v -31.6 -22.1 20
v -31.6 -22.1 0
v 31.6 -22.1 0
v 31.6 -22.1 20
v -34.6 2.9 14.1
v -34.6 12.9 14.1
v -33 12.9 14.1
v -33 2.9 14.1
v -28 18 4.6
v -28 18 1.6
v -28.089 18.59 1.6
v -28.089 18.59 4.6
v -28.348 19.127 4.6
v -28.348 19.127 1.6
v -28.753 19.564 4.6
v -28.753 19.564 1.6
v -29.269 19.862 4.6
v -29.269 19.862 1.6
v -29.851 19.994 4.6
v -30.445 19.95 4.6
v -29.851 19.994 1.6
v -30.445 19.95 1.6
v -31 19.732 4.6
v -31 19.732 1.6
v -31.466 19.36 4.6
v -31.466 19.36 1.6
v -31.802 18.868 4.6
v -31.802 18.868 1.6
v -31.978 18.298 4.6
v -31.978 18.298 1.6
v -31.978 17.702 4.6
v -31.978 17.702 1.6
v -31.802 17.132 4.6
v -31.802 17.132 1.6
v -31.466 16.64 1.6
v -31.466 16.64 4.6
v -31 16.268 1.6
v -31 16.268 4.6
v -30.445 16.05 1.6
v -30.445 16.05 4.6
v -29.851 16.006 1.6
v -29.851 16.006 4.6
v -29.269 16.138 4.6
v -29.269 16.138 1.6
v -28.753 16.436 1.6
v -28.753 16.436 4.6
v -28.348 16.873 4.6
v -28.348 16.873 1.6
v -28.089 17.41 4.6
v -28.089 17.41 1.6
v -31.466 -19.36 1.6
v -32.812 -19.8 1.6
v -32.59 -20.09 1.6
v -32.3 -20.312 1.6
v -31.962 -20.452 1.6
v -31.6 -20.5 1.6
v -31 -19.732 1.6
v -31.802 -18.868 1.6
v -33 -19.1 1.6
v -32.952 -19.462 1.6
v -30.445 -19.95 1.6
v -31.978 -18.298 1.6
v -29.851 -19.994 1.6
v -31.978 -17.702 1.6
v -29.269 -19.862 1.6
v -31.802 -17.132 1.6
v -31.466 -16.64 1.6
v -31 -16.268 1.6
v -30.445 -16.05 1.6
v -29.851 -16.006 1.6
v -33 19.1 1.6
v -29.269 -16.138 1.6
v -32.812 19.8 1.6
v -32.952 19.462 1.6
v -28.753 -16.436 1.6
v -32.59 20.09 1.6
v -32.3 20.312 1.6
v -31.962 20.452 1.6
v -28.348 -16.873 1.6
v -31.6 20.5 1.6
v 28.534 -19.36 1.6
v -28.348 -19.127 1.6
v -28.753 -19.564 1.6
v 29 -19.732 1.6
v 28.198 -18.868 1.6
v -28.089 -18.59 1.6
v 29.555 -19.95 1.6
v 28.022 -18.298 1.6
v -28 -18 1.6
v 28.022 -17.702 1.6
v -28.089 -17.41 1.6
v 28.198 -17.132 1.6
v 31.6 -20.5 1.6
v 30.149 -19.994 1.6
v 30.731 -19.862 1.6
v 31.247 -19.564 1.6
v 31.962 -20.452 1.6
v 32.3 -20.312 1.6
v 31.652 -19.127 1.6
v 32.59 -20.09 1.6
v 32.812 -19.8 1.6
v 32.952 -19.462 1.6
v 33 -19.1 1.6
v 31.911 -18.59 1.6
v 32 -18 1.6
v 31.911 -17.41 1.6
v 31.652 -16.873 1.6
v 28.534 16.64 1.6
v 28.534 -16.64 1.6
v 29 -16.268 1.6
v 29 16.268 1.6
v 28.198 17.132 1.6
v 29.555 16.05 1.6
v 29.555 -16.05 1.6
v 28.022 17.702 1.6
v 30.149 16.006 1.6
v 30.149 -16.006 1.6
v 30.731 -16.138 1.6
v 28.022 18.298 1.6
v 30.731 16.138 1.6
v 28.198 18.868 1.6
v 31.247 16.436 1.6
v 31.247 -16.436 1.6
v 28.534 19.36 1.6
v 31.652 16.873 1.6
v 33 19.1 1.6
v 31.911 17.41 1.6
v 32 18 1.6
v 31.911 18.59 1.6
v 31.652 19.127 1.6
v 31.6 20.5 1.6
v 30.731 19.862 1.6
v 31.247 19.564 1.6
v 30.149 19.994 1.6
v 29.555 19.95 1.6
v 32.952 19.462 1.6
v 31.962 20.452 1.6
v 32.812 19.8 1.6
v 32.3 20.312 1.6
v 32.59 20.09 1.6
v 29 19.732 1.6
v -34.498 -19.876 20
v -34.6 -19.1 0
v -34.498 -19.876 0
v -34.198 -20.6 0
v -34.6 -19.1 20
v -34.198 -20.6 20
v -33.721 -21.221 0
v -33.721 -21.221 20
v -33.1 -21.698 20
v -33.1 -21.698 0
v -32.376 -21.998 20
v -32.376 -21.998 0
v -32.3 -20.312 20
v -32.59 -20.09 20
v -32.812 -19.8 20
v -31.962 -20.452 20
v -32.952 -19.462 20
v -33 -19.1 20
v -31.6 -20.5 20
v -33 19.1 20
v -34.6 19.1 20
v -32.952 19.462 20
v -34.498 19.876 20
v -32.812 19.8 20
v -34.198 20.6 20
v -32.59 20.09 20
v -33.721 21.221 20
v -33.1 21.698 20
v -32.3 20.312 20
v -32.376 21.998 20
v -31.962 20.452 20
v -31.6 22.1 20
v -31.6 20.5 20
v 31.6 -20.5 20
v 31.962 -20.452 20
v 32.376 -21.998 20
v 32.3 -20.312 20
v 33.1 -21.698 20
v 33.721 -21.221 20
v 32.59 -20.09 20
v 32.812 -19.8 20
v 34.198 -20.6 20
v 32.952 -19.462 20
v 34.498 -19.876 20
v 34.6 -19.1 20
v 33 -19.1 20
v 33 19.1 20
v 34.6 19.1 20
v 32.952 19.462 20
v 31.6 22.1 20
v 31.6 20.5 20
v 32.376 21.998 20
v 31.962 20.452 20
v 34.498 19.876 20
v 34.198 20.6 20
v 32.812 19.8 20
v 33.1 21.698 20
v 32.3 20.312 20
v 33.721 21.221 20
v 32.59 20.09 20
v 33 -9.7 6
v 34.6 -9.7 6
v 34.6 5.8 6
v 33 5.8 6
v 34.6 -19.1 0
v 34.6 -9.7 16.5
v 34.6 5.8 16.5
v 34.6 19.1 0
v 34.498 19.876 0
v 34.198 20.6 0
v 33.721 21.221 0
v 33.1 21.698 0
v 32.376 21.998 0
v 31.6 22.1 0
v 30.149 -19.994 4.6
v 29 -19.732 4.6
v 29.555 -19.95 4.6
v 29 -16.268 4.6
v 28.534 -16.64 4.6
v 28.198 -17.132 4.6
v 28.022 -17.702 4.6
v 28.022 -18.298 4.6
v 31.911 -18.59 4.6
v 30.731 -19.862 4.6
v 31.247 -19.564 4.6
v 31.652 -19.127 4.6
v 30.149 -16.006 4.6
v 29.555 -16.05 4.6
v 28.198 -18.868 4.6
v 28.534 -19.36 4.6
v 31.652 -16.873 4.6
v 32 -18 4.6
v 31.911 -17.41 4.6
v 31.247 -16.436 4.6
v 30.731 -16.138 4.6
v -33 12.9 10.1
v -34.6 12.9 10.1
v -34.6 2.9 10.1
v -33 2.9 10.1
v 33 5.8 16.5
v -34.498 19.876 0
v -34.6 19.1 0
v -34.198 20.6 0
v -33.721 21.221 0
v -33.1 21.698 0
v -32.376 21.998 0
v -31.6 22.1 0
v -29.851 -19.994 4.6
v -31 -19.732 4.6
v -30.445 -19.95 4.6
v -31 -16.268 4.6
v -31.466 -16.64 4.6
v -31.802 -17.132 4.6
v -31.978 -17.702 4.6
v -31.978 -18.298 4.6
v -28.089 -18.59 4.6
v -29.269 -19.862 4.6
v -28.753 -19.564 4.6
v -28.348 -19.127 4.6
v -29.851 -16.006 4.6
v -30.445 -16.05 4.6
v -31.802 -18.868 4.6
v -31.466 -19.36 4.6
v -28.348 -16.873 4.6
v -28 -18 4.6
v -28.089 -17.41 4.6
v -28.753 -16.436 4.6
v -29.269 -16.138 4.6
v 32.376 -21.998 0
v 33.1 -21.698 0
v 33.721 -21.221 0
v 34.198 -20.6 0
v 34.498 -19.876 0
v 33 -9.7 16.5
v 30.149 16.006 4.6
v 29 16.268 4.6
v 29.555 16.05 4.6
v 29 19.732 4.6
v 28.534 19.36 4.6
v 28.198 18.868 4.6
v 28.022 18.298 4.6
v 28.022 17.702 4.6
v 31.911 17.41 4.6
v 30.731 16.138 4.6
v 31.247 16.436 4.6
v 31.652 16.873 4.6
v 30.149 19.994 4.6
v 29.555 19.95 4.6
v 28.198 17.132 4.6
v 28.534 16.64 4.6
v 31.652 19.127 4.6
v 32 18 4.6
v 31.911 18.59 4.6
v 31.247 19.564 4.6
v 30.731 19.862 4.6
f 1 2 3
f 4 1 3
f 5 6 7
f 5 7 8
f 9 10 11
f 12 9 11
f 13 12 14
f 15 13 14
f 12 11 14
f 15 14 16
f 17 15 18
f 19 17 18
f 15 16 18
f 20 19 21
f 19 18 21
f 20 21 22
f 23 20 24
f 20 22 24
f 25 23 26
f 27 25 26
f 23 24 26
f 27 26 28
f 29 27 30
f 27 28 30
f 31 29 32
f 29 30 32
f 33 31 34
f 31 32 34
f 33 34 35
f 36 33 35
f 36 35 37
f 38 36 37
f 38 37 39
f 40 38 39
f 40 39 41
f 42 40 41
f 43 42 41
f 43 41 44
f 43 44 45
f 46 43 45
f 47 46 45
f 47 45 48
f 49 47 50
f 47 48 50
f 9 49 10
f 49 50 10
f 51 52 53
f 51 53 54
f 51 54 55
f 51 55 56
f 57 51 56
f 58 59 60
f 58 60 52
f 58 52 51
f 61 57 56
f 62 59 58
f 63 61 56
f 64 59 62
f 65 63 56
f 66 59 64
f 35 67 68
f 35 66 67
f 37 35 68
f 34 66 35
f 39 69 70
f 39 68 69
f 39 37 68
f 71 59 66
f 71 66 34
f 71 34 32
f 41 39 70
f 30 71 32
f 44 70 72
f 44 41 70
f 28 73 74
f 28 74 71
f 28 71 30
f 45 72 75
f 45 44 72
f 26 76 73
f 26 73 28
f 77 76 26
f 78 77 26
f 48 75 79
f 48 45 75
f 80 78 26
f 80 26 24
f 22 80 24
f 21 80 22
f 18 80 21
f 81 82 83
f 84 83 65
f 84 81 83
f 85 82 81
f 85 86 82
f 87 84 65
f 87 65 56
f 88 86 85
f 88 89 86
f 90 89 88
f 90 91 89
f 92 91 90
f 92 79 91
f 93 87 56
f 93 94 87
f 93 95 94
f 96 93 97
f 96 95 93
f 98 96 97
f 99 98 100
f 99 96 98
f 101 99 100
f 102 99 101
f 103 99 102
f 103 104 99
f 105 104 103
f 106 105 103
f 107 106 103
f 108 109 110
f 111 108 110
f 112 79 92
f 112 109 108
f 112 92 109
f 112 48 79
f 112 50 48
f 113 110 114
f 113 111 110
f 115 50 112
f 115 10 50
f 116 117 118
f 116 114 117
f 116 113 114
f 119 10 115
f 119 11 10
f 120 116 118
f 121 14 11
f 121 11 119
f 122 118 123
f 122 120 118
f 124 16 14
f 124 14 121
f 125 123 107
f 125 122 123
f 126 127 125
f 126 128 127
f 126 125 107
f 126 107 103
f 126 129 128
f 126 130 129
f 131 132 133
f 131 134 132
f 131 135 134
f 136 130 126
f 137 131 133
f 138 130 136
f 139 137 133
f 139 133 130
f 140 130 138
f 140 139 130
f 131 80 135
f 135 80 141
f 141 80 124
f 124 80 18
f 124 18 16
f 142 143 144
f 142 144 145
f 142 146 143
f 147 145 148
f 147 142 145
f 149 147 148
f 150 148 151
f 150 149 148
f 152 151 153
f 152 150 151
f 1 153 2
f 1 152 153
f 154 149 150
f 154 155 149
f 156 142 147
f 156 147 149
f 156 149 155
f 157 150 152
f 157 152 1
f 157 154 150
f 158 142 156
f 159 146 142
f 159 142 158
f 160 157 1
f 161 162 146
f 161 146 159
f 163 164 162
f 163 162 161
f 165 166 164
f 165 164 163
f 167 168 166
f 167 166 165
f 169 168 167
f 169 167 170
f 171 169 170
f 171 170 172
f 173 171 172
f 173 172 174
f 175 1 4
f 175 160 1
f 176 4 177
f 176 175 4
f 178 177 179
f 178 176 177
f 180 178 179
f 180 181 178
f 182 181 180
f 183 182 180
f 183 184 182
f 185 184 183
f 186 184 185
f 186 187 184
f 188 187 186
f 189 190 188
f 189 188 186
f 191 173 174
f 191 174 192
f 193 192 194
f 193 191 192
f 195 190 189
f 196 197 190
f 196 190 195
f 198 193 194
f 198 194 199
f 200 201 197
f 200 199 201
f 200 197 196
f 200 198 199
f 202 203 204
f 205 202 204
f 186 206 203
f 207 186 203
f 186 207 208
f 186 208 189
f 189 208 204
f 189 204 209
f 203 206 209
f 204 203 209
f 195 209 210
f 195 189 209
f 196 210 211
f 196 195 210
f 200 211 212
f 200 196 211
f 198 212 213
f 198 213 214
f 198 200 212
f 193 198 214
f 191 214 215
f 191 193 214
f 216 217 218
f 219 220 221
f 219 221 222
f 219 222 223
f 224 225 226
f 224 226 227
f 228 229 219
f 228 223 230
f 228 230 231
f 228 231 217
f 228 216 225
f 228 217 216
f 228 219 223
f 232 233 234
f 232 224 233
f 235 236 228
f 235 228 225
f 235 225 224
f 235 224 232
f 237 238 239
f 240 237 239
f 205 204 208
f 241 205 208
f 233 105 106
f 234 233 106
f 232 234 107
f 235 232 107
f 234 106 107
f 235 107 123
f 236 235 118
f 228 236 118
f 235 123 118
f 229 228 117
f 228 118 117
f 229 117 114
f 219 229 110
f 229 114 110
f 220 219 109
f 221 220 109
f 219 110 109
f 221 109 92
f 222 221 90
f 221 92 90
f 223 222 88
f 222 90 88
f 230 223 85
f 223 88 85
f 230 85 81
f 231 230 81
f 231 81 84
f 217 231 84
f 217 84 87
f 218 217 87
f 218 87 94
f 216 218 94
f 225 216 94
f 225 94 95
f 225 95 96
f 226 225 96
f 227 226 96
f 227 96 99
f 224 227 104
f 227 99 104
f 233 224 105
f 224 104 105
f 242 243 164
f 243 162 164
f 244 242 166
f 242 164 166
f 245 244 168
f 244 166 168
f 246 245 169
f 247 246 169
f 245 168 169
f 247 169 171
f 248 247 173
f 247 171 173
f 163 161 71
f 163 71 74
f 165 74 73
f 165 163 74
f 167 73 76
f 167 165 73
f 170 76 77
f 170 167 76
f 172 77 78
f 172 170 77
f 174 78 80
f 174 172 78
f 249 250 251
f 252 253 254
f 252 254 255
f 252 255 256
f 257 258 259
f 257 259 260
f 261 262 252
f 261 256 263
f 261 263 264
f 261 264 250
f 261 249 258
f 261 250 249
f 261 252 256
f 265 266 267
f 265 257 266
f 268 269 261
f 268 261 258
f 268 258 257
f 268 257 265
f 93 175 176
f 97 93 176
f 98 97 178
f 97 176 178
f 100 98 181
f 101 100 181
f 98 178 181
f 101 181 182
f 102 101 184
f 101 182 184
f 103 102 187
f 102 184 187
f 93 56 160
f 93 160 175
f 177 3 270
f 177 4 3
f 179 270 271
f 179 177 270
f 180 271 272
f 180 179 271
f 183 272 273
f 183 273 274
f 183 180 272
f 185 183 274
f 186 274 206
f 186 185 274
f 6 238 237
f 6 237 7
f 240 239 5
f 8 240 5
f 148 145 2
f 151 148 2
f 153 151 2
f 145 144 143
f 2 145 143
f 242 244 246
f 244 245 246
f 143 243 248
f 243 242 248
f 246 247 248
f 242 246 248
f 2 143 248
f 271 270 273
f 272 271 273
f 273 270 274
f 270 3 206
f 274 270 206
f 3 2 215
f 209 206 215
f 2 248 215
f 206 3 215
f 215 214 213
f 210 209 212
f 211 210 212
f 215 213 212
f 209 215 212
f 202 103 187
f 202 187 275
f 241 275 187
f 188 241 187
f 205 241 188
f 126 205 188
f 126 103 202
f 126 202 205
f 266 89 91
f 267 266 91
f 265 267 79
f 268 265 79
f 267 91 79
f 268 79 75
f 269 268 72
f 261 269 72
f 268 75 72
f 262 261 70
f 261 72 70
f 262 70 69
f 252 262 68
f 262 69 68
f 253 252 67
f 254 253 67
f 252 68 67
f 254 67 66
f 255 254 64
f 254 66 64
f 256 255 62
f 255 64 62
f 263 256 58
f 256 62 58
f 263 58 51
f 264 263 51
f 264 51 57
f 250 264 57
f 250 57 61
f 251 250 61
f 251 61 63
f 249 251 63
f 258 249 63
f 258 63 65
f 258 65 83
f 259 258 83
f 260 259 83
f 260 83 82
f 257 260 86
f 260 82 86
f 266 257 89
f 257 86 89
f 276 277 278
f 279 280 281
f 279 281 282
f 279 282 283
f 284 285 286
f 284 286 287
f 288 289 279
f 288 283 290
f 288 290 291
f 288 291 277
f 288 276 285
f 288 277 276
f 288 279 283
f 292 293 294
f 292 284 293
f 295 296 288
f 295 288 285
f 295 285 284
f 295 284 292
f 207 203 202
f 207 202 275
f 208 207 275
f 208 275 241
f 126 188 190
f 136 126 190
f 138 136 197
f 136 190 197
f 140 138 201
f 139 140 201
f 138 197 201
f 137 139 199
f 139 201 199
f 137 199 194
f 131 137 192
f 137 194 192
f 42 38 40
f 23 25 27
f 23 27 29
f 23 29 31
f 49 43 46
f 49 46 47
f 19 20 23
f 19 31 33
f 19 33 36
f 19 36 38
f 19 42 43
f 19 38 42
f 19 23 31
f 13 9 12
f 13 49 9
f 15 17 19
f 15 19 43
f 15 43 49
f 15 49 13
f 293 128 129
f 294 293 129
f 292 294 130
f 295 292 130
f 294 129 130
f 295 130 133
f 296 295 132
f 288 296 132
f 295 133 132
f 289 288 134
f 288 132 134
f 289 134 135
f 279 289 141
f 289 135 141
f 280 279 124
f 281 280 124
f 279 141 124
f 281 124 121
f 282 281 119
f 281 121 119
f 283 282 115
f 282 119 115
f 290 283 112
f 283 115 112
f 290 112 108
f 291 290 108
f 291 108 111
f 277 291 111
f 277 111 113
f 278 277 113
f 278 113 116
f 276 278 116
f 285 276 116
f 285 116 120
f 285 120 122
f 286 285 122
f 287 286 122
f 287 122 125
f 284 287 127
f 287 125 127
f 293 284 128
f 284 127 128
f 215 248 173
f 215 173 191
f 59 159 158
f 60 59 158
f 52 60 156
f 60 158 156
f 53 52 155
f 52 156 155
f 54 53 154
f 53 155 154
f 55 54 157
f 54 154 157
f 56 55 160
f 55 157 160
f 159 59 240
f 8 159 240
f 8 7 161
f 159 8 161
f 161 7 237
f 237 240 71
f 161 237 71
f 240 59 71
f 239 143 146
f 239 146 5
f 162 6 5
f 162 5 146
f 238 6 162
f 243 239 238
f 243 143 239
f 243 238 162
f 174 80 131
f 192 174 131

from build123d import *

# Parameters (mm, degrees)
F0_W     = 69.2
F0_H     = 44.2
F1_DEPTH = 20
F2_R     = 3
F3_T     = -1.6
F4_R     = 2
F5_DEPTH = 3
F6_W     = 15.5
F6_H     = 10.5
F7_DEPTH = 1.6
F8_W     = 10
F8_H     = 4
F9_DEPTH = 1.6


with BuildPart() as f1:
    # F0 (on Top) → F1 (new body)
    with BuildSketch(Plane.XY):
        Rectangle(F0_W, F0_H)
    extrude(amount=F1_DEPTH)

    # F2
    f2_edges = [f1.edges().sort_by_distance(p)[0] for p in [
        (34.6, -22.1, 10),
        (34.6, 22.1, 10),
        (-34.6, 22.1, 10),
        (-34.6, -22.1, 10),
    ]]
    fillet(f2_edges, radius=F2_R)

    # F3
    f3_openings = [f1.faces().sort_by_distance(p)[0] for p in [
        (0, 0, 20),
    ]]
    offset(amount=F3_T, openings=f3_openings)

    # F4 (on face) → F5 (join)
    with BuildSketch(Plane.XY.offset(1.6)):
        with Locations((-30, 18)):
            Circle(F4_R)
        with Locations((30, 18)):
            Circle(F4_R)
        with Locations((30, -18)):
            Circle(F4_R)
        with Locations((-30, -18)):
            Circle(F4_R)
    extrude(amount=F5_DEPTH)

    # F6 (on face) → F7 (cut, through all)
    with BuildSketch(Plane.YZ.offset(34.6)):
        with Locations((-1.95, 11.25)):
            Rectangle(F6_W, F6_H)
    extrude(amount=-F7_DEPTH, mode=Mode.SUBTRACT)

    # F8 (on face) → F9 (cut, through all)
    with BuildSketch(Plane(origin=(-34.6, 0, 0), x_dir=(0, -1, 0), z_dir=(-1, 0, 0))):
        with Locations((-7.9, 12.1)):
            Rectangle(F8_W, F8_H)
    extrude(amount=-F9_DEPTH, mode=Mode.SUBTRACT)


solid = f1.part
